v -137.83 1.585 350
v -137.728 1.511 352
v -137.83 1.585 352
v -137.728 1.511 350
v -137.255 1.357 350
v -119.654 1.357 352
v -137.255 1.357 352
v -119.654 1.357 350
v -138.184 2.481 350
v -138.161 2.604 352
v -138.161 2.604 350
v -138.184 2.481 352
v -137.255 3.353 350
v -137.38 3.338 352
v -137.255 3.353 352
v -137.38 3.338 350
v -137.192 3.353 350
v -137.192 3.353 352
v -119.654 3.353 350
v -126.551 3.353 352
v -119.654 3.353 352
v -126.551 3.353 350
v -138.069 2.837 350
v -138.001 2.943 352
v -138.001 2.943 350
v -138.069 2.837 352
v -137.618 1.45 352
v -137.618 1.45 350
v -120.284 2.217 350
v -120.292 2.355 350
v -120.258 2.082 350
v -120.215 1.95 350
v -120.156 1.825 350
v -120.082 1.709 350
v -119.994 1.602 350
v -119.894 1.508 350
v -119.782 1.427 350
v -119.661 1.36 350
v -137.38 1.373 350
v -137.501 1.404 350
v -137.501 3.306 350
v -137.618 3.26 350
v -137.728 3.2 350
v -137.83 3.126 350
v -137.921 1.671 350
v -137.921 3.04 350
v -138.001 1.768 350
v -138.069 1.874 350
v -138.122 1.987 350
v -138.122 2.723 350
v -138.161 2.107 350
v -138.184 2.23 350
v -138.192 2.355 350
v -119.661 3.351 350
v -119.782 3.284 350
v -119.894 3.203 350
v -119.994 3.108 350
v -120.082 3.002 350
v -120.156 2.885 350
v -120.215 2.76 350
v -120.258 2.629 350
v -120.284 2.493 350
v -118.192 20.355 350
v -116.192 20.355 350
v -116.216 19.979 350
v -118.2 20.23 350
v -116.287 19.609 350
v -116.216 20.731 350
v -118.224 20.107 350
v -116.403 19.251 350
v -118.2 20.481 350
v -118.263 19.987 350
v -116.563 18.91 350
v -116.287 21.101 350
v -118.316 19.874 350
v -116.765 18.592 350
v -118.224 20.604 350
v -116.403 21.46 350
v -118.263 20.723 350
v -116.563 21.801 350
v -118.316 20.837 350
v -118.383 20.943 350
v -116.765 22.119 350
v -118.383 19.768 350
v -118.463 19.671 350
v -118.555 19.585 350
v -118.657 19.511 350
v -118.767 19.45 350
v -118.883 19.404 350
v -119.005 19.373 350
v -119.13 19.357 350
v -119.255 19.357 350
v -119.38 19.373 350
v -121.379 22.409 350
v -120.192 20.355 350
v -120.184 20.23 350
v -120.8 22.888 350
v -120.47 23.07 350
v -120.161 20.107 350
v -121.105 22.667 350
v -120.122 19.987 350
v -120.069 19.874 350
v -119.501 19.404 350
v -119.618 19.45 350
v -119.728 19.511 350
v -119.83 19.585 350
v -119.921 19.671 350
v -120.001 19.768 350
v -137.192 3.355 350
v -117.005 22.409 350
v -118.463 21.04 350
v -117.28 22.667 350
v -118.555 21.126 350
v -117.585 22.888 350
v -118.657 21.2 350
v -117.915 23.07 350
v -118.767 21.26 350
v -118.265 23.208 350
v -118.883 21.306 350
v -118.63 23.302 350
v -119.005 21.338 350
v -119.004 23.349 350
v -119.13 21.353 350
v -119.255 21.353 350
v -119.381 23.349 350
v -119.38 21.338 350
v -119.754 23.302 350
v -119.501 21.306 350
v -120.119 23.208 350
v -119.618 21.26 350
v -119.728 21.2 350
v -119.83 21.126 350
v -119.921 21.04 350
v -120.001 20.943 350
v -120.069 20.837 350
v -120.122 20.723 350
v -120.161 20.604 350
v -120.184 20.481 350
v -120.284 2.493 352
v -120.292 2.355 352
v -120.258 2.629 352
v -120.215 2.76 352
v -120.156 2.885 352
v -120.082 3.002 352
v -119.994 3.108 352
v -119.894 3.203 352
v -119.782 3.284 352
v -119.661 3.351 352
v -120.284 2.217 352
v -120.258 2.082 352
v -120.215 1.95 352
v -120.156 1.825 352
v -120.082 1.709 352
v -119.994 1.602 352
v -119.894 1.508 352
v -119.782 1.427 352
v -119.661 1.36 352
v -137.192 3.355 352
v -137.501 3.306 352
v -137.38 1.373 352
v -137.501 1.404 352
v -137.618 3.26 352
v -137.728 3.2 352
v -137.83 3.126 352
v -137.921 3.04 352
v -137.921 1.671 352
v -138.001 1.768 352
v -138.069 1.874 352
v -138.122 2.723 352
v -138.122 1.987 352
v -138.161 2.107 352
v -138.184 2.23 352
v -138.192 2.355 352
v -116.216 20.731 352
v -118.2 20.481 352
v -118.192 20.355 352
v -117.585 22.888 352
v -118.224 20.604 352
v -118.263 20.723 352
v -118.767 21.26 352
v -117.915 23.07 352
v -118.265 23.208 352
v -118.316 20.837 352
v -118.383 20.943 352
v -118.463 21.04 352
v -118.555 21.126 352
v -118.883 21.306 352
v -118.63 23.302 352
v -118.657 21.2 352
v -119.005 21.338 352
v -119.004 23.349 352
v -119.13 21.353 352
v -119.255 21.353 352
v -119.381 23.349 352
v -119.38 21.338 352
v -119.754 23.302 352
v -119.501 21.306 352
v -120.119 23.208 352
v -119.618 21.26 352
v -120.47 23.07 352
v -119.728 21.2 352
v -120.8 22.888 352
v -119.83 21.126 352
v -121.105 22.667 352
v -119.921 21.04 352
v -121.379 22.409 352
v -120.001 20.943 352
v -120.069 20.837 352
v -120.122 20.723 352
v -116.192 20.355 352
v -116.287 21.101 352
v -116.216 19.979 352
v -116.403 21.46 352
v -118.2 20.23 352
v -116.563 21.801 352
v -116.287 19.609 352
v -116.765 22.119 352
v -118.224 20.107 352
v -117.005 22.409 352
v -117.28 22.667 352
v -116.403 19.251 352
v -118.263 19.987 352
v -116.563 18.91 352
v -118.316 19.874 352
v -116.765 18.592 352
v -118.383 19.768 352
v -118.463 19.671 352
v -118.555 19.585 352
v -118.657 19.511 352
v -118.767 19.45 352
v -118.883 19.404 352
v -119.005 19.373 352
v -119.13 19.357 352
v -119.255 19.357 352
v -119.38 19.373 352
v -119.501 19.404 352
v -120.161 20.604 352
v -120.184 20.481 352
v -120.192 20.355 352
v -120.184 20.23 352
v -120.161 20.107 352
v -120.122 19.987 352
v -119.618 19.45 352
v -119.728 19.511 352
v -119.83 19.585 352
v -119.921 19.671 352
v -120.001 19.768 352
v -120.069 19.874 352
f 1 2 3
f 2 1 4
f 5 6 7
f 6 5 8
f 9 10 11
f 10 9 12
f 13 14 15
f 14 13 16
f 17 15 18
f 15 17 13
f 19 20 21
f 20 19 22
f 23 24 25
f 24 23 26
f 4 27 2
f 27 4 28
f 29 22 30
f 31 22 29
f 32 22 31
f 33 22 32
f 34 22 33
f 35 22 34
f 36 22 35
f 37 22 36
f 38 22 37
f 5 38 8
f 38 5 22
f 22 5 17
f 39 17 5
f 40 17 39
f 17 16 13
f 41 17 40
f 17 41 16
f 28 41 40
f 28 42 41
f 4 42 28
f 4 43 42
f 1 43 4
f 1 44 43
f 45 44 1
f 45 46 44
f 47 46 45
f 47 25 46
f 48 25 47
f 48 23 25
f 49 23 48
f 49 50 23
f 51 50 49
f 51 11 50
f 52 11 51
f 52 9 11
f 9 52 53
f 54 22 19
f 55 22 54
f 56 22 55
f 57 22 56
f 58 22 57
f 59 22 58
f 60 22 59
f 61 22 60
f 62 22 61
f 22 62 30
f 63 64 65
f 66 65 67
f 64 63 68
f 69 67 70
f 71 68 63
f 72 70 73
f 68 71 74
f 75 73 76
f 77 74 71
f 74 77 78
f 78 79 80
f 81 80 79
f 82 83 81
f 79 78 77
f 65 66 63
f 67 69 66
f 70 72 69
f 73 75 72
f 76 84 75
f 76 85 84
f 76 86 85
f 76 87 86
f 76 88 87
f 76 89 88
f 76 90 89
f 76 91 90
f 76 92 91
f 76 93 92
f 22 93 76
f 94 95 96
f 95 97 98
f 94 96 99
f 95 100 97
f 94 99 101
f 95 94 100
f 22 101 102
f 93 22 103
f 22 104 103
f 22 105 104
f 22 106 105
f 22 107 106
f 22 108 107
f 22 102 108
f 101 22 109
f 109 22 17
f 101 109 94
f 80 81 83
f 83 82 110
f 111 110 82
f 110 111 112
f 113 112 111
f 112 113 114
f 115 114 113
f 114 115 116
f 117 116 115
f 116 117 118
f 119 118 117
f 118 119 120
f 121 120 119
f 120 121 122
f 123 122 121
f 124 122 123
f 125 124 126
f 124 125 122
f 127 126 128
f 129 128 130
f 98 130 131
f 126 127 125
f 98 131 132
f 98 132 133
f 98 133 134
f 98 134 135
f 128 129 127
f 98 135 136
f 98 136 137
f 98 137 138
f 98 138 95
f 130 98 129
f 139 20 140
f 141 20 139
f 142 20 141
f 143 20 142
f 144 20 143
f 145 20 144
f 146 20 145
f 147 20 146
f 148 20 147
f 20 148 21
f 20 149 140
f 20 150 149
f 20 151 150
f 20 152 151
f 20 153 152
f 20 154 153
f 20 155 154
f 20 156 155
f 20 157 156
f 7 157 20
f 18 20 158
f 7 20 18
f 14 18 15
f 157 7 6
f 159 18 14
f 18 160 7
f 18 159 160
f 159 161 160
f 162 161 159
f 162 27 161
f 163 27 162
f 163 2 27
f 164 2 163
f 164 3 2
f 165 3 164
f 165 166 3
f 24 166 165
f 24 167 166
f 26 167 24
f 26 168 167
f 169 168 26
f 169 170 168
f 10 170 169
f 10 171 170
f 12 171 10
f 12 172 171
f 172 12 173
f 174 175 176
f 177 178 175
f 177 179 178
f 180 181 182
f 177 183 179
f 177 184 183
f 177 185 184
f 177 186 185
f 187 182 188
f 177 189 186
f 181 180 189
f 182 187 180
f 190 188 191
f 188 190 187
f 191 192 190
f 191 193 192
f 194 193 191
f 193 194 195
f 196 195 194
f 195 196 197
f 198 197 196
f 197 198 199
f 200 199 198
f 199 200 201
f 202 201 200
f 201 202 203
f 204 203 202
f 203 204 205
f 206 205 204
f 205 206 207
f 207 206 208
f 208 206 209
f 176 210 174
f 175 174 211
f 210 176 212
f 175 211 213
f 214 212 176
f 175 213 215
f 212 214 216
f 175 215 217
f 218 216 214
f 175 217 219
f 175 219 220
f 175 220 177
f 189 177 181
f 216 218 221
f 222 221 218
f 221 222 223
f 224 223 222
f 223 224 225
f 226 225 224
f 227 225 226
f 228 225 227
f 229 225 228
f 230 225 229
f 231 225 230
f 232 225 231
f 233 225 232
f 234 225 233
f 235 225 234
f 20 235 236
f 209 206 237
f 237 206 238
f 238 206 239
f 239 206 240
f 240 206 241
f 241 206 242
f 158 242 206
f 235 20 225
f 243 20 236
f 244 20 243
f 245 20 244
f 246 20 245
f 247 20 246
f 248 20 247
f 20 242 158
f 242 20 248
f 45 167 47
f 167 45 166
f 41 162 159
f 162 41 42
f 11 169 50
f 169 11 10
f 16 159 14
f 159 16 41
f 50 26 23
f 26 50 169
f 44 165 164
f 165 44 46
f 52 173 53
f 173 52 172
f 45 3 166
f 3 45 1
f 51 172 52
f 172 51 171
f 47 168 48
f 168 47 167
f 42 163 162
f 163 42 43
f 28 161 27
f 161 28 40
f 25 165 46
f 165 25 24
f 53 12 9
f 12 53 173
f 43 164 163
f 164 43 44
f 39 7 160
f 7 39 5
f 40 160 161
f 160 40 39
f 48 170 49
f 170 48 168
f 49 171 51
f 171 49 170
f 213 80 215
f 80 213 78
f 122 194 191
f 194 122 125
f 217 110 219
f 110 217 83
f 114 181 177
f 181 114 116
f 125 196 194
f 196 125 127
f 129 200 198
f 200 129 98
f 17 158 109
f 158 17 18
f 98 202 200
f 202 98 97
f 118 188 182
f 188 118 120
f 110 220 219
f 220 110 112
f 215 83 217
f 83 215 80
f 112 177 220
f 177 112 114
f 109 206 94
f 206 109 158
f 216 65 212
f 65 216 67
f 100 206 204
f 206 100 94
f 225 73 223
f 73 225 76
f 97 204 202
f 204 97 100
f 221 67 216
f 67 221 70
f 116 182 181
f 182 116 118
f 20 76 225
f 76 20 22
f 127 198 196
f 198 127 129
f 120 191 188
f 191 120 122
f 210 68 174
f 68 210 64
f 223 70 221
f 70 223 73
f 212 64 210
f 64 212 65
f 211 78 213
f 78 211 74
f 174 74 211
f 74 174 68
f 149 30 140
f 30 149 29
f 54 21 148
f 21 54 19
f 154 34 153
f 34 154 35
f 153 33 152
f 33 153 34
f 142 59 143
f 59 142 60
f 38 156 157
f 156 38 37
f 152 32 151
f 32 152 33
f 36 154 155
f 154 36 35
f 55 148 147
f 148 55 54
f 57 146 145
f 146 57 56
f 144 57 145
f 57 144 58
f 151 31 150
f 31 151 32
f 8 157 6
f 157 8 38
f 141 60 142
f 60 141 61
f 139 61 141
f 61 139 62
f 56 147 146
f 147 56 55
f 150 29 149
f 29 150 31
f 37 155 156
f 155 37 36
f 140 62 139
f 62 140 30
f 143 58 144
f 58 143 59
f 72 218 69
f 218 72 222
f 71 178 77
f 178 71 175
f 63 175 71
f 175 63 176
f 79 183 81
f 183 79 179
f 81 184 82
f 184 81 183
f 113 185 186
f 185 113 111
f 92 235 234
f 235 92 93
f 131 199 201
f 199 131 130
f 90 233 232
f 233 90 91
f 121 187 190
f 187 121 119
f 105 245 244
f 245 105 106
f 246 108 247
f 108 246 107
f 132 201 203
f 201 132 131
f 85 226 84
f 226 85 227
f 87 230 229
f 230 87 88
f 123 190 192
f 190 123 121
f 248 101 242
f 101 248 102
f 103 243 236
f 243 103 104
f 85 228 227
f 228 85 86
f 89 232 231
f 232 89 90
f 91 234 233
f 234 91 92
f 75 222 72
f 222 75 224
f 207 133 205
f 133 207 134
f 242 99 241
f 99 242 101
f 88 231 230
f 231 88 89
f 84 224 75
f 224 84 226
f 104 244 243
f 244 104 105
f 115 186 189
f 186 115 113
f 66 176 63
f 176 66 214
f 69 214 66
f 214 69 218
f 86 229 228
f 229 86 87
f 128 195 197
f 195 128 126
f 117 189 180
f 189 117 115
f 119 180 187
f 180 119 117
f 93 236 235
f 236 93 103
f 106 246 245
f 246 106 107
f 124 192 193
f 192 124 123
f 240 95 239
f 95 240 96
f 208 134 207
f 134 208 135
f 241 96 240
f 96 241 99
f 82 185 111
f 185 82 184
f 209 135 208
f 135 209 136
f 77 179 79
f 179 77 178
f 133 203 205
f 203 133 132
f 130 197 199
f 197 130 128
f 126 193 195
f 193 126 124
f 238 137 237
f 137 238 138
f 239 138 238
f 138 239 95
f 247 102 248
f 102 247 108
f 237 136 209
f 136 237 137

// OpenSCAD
// file: ../planelib/motor.scad
yoff=10+2;
xoff=5;//10+17;
xlen=200;

module wingBoom( bd=8, diff=0.1, len=500 )
{
    translate([xoff,yoff,zBoom])
    translate([ -200,0,0]) rotate([0,90,0])cylinder(d=bd+diff,h=len,center=true);  //8mm version

}



module wingMotorPlate( diff=0, holes=true )
{
    h0=12;
    module mcylinder( diff=0 )
    {
        rotate([0,-90,0]) 
            translate([ 0,0,-3-diff ]) 
                cylinder(d=33+diff, h=55+diff,center=false);   // body cylinder
    }
    
    module mholes()
    {
        rotate([0,-90,0]) 
            ScrewMotorPlate(screwlen=60);
    }
    
    module cable_hole()
    {
        translate( [ -3, 15, 0 ] )
        rotate([90,0,0])
        hull(){
            translate([-10,0,0]) cylinder(d=5,h=10,center=true );
            translate([0,-2,0]) cylinder(d=4,h=10,center=true );
            translate([0,+2,0]) cylinder(d=4,h=10,center=true );
        }
    }

    difference(){
        union()
        {
            translate([xoff,yoff,zBoom])
                difference(){
                    mcylinder(0+2*diff);
                    if( holes==true ){
                        mcylinder(-4-2*diff);
                        mholes();
                        cable_hole();
                    }
                }
            translate([xoff,yoff,zBoom])
                intersection(){
                    mcylinder(0);
                    translate([-tubeOffset1-xoff ,tubeOffsety-yoff, 0]) 
                        cylinder(d=dBar1+8, h=33,center=true ); // bar mount
                    }
        }
        union()
        {
            if( holes==true ){
                translate([-tubeOffset1 ,tubeOffsety, zBoom]) 
                            cube([dBar1+10,dBar1+10,12+0.2], center=true );
                translate([ xoff-120/2-tubeOffset1, yoff, zBoom]) 
                    rotate([0,90,0])
                        cylinder(d=8+0.3+4+0.5,h=140,center=true);  // mount for boom 8mm version
                            
                wingPolyLine( d=dPoly, pt=pSD6060[31], off=[+2,+0.5] );
                wingElectric();
                xTube( diameter=8+0.1, length=1000, tubeoffset=tubeOffset1 );
                translate( [-xoff+0, yoff-11.2, zBoom ] ) 
                    rotate([90,0,0])
                        ScrewAndHexNut( m=2,dist=10 );
                }
            
        }
    }


}

module wingMotor(diff=0, holes=true) //use diff!!!!!
{
    h0=12; //10;    
    {
        difference(){
            union(){
                Slice(){
                    wingSolid(r=-1/*diff*/);
                    translate([ xoff-130/2-3-10, yoff-15+1, zBoom]) cube([150,25+2,h0], center=true );
                    }
                
                translate([-tubeOffset1 ,tubeOffsety, zBoom]) cylinder(d=dBar1+10, h=h0,center=true );
                translate([-tubeOffset2 ,tubeOffsety, zBoom]) cylinder(d=dBar2+10, h=h0,center=true );
                
                translate([ xoff-120/2-tubeOffset1, yoff, zBoom]) rotate([0,90,0])cylinder(d=8+4,h=120,center=true);  //8mm version
                
                }
            union(){
                translate([xoff-153,yoff-21,zBoom])
                    rotate([0,0,-45])
                        cube([20,20,20], center=true );

                if( holes==true ){
                    color("Black") wingBoom();
                    color("Black") xTube( diameter=8+0.2, length=1000, tubeoffset=tubeOffset1 );
                    color("Black") xTube( diameter=6+0.2, length=400, tubeoffset=tubeOffset2 );   
                    wingMotorPlate(diff=0.1); 
                    wingPolyLine( d=dPoly, pt=pSD6060[31], off=[+2,+0.5] );
                    *wingPolyLine( d=dPoly, pt=ptQRuder, off=[+0,+0] );
                    wingElectric();
                    translate( [-xoff+0, yoff-11.2, zBoom ] ) 
                        rotate([90,0,0])
                            ScrewAndHexNut( m=2,dist=10 );
                    translate([xoff,yoff,zBoom])
                        translate([-83,-8,0]) rcube([54,4,20], round=3);
                    translate([xoff-35,yoff-15,zBoom]){
                        translate([-113,2,0]) cube([30,20,1.2], center=true );
                        translate([-113,8,0]) ScrewAndHexNut( m=2,dist=8 );
                        }
                        
                    }
                }
        }
       
    }
    
    *translate([xoff,yoff,zBoom]){
        color("Red") translate([15+12,0,0]) rotate([0,90,0]) cylinder(d=7*25.4,h=8,center=true);   // propeller     
        color("Red") translate([12,0,0]) rotate([0,90,0]) cylinder(d=33,h=17,center=true);   // motor
        *%translate([0,-60,0]) cube( [300,1,500], center=true );
        }
    *color("Black") xTube( diameter=8, length=1000, tubeoffset=tubeOffset1 );
    *color("Black") xTube( diameter=6, length=400, tubeoffset=tubeOffset2 );    
    *wingMotorPlate(diff=0);

}

module wingMotorCoverSolid()
{
    diff=0;
    hull(){
        translate([xoff-55,yoff,zBoom]) // body cylinder taken from wingMotorPlate()
            rotate([0,-90,0]) 
                translate([ 0,0,-3-diff ]) 
                    cylinder(d=33+diff, h=1,center=false);   
        translate([ xoff-120+0.5-tubeOffset1, yoff, zBoom]) rotate([0,90,0])cylinder(d=8+4+2,h=1,center=true);  // taken from wingMotor
        }
}

module fuseMotor(d=0.5, holes=true) // not needed with two motors at the wings
{
// 19mm Löcher, Motokreuz: Balken mit 2 Schrauben, Gegenstück in den Rumpf kleben....
    translate([9.5,0,0])
    difference()
    {
        union()
        {
            translate([-280,0,0]){   // cutout inner Motormount
                rotate([0,90,0]) cylinder( d=30-d, h = 3 ); // h=5 was too fat, because it is solid
                }
            translate([-282,0,0]){   // cutout outer Motormount
                rotate([0,90,0]) cylinder( d=35-d, h=3 );
                }
            translate([-282,0,0]){   // cutout outer Motormount
                rotate([0,90,0]) resize([50,20,3])cylinder( d=35-d, h=3 );
                }
            translate([-260,0,+20]) 
                    rotate([0,-90,0]) 
                        cylinder( d=3.8, h=30 );   
            translate([-260,0,-20]) 
                    rotate([0,-90,0]) 
                        cylinder( d=3.8, h=30 );  
            if( !holes ){
            translate([-250+6,0,-20]) 
                    rotate([0,-90,0]) 
                        cylinder( d=6.5, h=30,$fn=6 );   
            translate([-250+6,0,+20]) 
                    rotate([0,-90,0]) 
                        cylinder( d=6.5, h=30,$fn=6 );   
                }
            
        }
        if(holes)
        union()
        {
            translate([-270,0,0]) 
                    rotate([0,-90,0]) 
                        cylinder( d=9, h=40 );   
            translate([-270,0,0])
                rotate([0,-90,0])
                    for( rot=[0:90:360] )
                        rotate([0,0,rot+45])
                            translate([0,19/2,0])
                                    cylinder( d=3.8, h=40 );
            translate([-260,0,+20]) 
                    rotate([0,-90,0]) 
                        cylinder( d=3.8, h=30 );   
            translate([-260,0,-20]) 
                    rotate([0,-90,0]) 
                        cylinder( d=3.8, h=30 );   
        }
    }
}
// file: ../planelib/ruder2.scad
// Ruder new version, test with small cut, printable?

*cutterObjectAll( ptStart=[0,0,0], dStart=20, ptStop=[-20,0,100], dStop=10, dSpace=1.0, rot=45, steps=5, inverse=false );
*cutterMask( ptStart=[0,0,0], dStart=20+2*1, ptStop=[-20,0,100], dStop=10+2*1 );
*cutterEnds( pt=[0,0,0], d=20+2*1, dSpace=1.0, axis=false );

function RuderGetSize( z, zStart, zStop, sStart, sStop ) = ( ( sStart + (sStop-sStart)/(zStop-zStart)*(z-zStart) ) );
function RuderGetHeight( z, zStart, zStop, sStart, sStop, hBase ) = ( RuderGetSize( z, zStart, zStop, sStart, sStop) * hBase );
function RuderGetPoint( z, zStart, zStop, sStart, sStop, ptBase ) = ( RuderGetSize( z, zStart, zStop, sStart, sStop) * ptBase );
function RuderGetXOffset( z, zStart, zStop, oStart, oStop ) = ( ( oStart + (oStop-oStart)/(zStop-zStart)*(z-zStart) ) );

module Ruder2( ptStart=[0,0,0], dStart=20, ptStop=[0,0,100], dStop=10, dSpace=1.0, rot=45, steps=5, inverse=false, horn=false )
{
    difference(){
        children();
        cutterObjectAll(  ptStart, dStart, ptStop, dStop, dSpace, rot, steps, inverse );
        cutterInnerAxis( ptStart, ptStop );
        cutterEnds( ptStart, dStart, dSpace, axis=false );
        cutterEnds( ptStop, dStop, dSpace, axis=false );
        }
        
    if( horn ) 
        RuderHorn( dbase=dStart, pos = ptStart + [0,0,dSpace/2] );
}

module RuderHornCut(dbase, daxsis=2.2, dwire=2, pos=[0,0,0], h=2, a=18, diff=0)
{
    //scale([1,1,2])
    cutterEnds( pos, d=dbase, dSpace=0.2, axis=true );
}

module RuderHorn( dbase, daxsis=2.2, dwire=2, pos=[0,0,0], h=2, a=18, diff=0 )
{
    b=a;
    translate( pos ) 
        difference(){
            union(){
                hull(){
                    translate([0,0,0])  cylinder( d=dbase-2+diff, h=h, center=false );
                    translate([-a,0,0]) cylinder( d=2+diff, h=h, center=false );
                    }
                hull(){
                    translate([-a,0,0]) cube( [10,1,h], center=false );
                    translate([0,b,0])  cylinder( d=6+diff, h=h, center=false );
                    }
                }
            union(){
                translate([0,0,0])  cylinder( d=daxsis, h=h, center=false );
                translate([0,b,0])  cylinder( d=dwire, h=h, center=false ); 
                //translate([-a,0,0])  cylinder( d=dwire, h=h, center=false ); 
                c = b-6/2-dbase/2; 
                *translate([-c,c,0])  cylinder( d=c, h=h, center=false ); 
            }
    }
}

module cutterObjectAll( ptStart, dStart, ptStop, dStop, dSpace, rot=45, steps=5, inverse=false )
{
    ptDelta = (ptStop - ptStart) / steps; 
    dDelta = (dStop - dStart) / steps; 
    
    for( i=[0:steps-1] )
    {
        dir = inverse ? !((i%2)==0) : ((i%2)==0) ;
        cutterObjectSingle(  
            ptStart+i*ptDelta, dStart+i*dDelta, 
            ptStart+(i+1)*ptDelta, dStart+(i+1)*dDelta, 
            dSpace, dir, steps );
    }
}

module cutterObjectSingle( ptStart, dStart, ptStop, dStop, dSpace, dir=false, rot=45 )
{
    difference()
    {
        union()
        {
            cutterCylinder( ptStart, dStart+2*dSpace, ptStop, dStop+2*dSpace );
            if( dir == true )
            {
                cutterMask( ptStart, dStart+2*dSpace, ptStop, dStop+2*dSpace, dir, rot=+rot );
                cutterMask( ptStart, dStart+2*dSpace, ptStop, dStop+2*dSpace, dir, rot=-rot );
            }
            cutterSpacer( ptStart, dStart+2*dSpace, dSpace ); // find a way to not call cutterSpacer at the ends?
            cutterSpacer( ptStop, dStop+2*dSpace, dSpace ); // this partly dublicate
        }
        union()
        {
            cutterCylinder( ptStart, dStart, ptStop, dStop );
            cutterHalf( ptStart, dStart, ptStop, dStop, dir );
        }
    }
}

module cutterCylinder( ptStart, dStart, ptStop, dStop )
{
    hull()
    {
        translate( ptStart ) cylinder( d=dStart, h=0.001, center=true );
        translate( ptStop )  cylinder( d=dStop, h=0.001, center=true  );
    }
}

module cutterMask( ptStart, dStart, ptStop, dStop, dir=true, rot=40 )
{
    oxStart = dir ? 0 : -dStart;
    oxStop = dir ? 0 : -dStop;
    
    hull(){
        translate( ptStart ) 
            rotate( [0,0,rot] )
                translate( [oxStart,-dStart/2,0] )
                    cube([dStart/2,dStart, 0.001], center=false );
        translate( ptStop ) 
            rotate( [0,0,rot] )
                translate( [oxStop,-dStop/2,0] )
                    cube([dStop/2,dStop, 0.001], center=false );
        }
}

module cutterHalf( ptStart, dStart, ptStop, dStop, dir=true )
{
    oxStart = dir ? 0 : -dStart;
    oxStop = dir ? 0 : -dStop;
    hull(){
        translate( ptStart ) 
                translate( [oxStart,-dStart,0] )
                    cube([dStart,2*dStart, 0.001], center=false );
        translate( ptStop ) 
                translate( [oxStop,-dStop,0] )
                    cube([dStop,2*dStop, 0.001], center=false );
        }
}

module cutterSpacer( ptStart, dStart, dSpace )
{
    translate( ptStart )
        cylinder( d=dStart, h=dSpace, center=true );
}

module cutterInnerAxis( ptStart, ptStop, dAxis=2.2 )    // set the correct parameter dAxis
{
    hull()
    {
        translate( ptStart ) sphere( d=dAxis );
        translate( ptStop ) sphere( d=dAxis );
    }
}

module cutterEnds( pt, d, dSpace, axis=false )
{
    translate( pt ) 
        difference()
        {
            union()
            {
                cylinder( d=d+2*dSpace, h=dSpace, center=true );
                translate( [-100,-20,-dSpace/2] ) cube( [100,40,dSpace], center=false );
            }
            if ( axis==false ) cylinder( d=d+2*dSpace, h=dSpace, center=true );
        }
}
// file: ../planelib/screw.scad
// screw and nut helper


//ScrewAndHexNut( m=2, $fn=50 );

module ScrewAndHexNut( m=2, dist=10 )
{
    
    dscrew  = (m==2) ? 2.3 : ((m==3) ? 3.2 : 4.1 );   // screw, loose
    dnut    = (m==2) ? 4.6 : ((m==3) ? 6.2 : 8.0 );   // hex nut, measured
    dhead   = (m==2) ? 4.2 : ((m==3) ? 5.8 : 7.0 );   //hex head
    
    translate( [ 0, 0, -dist/2-10/2 ] ) 
        cylinder(d=4.6, h=10, center=true, $fn=6 ); //m2 nut, 6 edge hole
    translate( [ 0, 0, 0 ] ) 
        cylinder(d=2.3, h=dist+20, center=true ); //m2 screw
    translate( [ 0, 0, +dist/2+10/2 ] ) 
        cylinder(d=4.2, h=10, center=true ); //m2 head
}

module ScrewServo( dist=10 )
{
    cylinder(d=1.5, h=dist ); // servo screw, does not realy fit
}

module ScrewMotorPlate( dscrew=3.5, distmin=15.5, distmax=19.5, dcenter=8, rotoffset=0, screwlen=6, plate=6 )
{
    for( a=[45:90:360]) 
        rotate([0,0,a+rotoffset]) 
            hull(){
                translate( [0, distmax/2, -plate-0.1] ) // max plate is fixed 6
                    cylinder( d=dscrew, h=screwlen, center=false ); // motor screws
                translate( [0, distmin/2, -plate-0.1] ) 
                    cylinder( d=dscrew, h=screwlen, center=false ); // motor screws
                }
    translate( [0, 0, -plate-0.1] ) 
        cylinder( d=dcenter, h=plate+1, center=false ); // motor center

}
// file: ../planelib/servo.scad
servo_size_1 = [25.5,12,37];  // mg90s
servo_size_2 = [33.5,12,3];

*servo_sg90($fn=50);

module servo_sg90()
{
        cube( servo_size_1, center=true );
        translate([0,0,3.5]) 
            cube( servo_size_2, center=true );
        // servoarm...
        translate([-5,6,17])
        resize([60,12,6+1])
        sphere( d=1 );
}
    

module ServoDiff( sx=100, sy=7, sz=348, rot=0 )
{ 
    //sx = s[i]*(tubeOffset1+tubeOffset2)/2;  // between the tubes
    //sz = (o[i+1].z-o[i].z)/2;   // in the middle of the segment
    //sz = -2;
    translate( [-sx, sy, sz])
            rotate([0,rot, 2])
                servo_sg90();
                
    
    // kabelkanal
    *translate( o[i] + [-sx+10, +11-2-2, hz/2-13])
            rotate([0,90,4])
                cube([12,5,10]);
}
// file: ../planelib/polyline.scad
module wingPolyLine( d=3, pt=[0,0], off=[0,0]  )
{
    *echo(pt);
    l = len(s)-1; 
    poly = [         [o[0].x - s[0]*pt.x - off.x , o[0].y + s[0]*pt.y + off.y,  o[0].z - 20 ],
        for(i=[0:l]) [o[i].x - s[i]*pt.x - off.x , o[i].y + s[i]*pt.y + off.y,  o[i].z ],
                     [o[l].x - s[l]*pt.x - off.x , o[l].y + s[l]*pt.y + off.y,  o[l].z + 20 ] ];
    *echo( poly);
    for( i=[0:(len(poly)-2)] ){
        hull(){
            translate(poly[i]) 
                sphere( d=d );
            translate(poly[i+1]) 
                sphere( d=d );
            }
        }
}

module fusePolyLine( d=3, size=605, off=[0,0], p=pClarkFusePolyUp )
{
    for( i=[0:(len(p)-2)] ){
        hull(){
            translate([p[i].x*size, p[i].y*size+off.y, +off.x]) 
                sphere( d=d );
            translate([p[i+1].x*size, p[i+1].y*size+off.y, +off.x]) 
                sphere( d=d );
            }
        *echo( p[i] );
        }
}

module fusePolyLineQ( d=3, size=605, pt=[0,0], off=[0,0] )
{
    poly = [        
                    [o[1].x - s[1]*pt.x - off.x , o[1].y + s[1]*pt.y + off.y,  +o[1].z ],
                    [o[0].x - s[0]*pt.x - off.x , o[0].y + s[0]*pt.y + off.y,  +o[0].z ],
                    [o[0].x - s[0]*pt.x - off.x , o[0].y + s[0]*pt.y + off.y,  -o[0].z ], 
                    [o[1].x - s[1]*pt.x - off.x , o[1].y + s[1]*pt.y + off.y,  -o[1].z ]
                    ];
                    
        for( i=[0:(len(poly)-2)] ){
                hull(){
                    translate(poly[i]) 
                        sphere( d=d );
                    translate(poly[i+1]) 
                        sphere( d=d );
                    }
        }
}

module offsetPolyLine(  d=3, size=605, off=10, p=pClarkY )  // this does not yet work, just a test.
{
    for( i=[0:(len(p)-1)] ){
        po = size * p[i];
        pv = size * ((i>0) ? p[i-1] : p[len(p)-1]);
        pn = size * ((i>(len(p)-2)) ? p[0] : p[i+1]);

        pop = (pv + pn)/2 + po;
        p02 = pn - po;
        z = p02.x * pop.y + p02.y * pop.x;
        
        pt = sign( z ) * pop * (off/norm(pop));
       

        
        hull(){
            translate([po.x+pt.x, po.y+pt.y, 0]) 
                sphere( d=d );
            translate([pn.x+pt.x, pn.y+pt.y, 0]) 
                sphere( d=d );
            }
        echo( po, pop, z );
    }
}
// file: ../planelib/wing.scad
module segment( s, o, r=0, p=pSD6060, begin=0, end=1 )
{
    factor = ( s[1] ) / ( s[0] );
    height = ( o[1].z - o[0].z );
    sx = ( o[1].x - o[0].x ) / height;
    sy = ( o[1].y - o[0].y ) / height;
    
    m=[ [ 1, 0,  sx, 0],
        [ 0, 1,  sy, 0],
        [ 0, 0,  1,  0],
        [ 0, 0,  0,  1] ];
    
    translate(o[0])
        multmatrix(m)
            linear_extrude( height=height, scale=factor, convexity=10 ) 
                intersection()
                {
                    spant2d( s=s[0], r=r, p=p );
                    scale(s) 
                        mirror([1,0]) // vgl spant2d()
                            translate( [begin,-0.5] ) 
                                square( [(end-begin), 1] );
                }
}


module spant3d( d=0.3, offset=[0,0,0], size=100, r=0, p=pSD6060 )
{
    translate(offset) linear_extrude( d, convexity=10 ) spant2d(size,r,p);
}

module spant3dDiff( d=0.3, offset=[0,0,0], size=100, rot=[0,0,0], ra=0, ri=-2.5, p=pSD6060 )
{
    translate(offset) rotate(rot) translate([0,0,-d/2]) linear_extrude( height=d, convexity=10 )
    difference()
    {
        spant2d( s=size, r=ra, p=p );
        spant2d( s=size, r=ri, p=p );
    }
}

module spant2d(s=1, r=0, p=pSD6060 )
{
    offset(delta=r)
    //alternative: offset(r=r)
    scale(s)
    mirror([1,0])  // sollte das weg?
    polygon(p);
}
// file: ../planelib/skin.scad
module outerSkin( d=1, h=0, center=true )
{
    hgt = (h<=0) ? h : 2*d;
    difference(){
        minkowski(){
            children();
            cylinder(r=d,h=hgt,center=center ); 
        }
        children();
    }
}

module outerSkin2( d=1, h=0, center=true )
{
    hgt = (h<=0) ? h : 2*d;
    difference(){
        minkowski(){
            children(0);
            cylinder(r=d,h=hgt,center=center ); 
        }
        children(1);
    }
}

module innerSkin( )
{
    difference(){
        children(0);
        children(1);    
        }
}

module skin2()
{
    difference()
    {
        minkowski()
        {
            children(0);
            children(1);    
        }
        children(0);
    }
}

module Slice( )
{
    intersection()
    {
        children(0);
        children(1);
    }
}

module gridSlice( dy=30, angy=30, grid=2, dim=1000 )
{
    Slice(){
        children();
        for(z=[-dim:dy:dim], angy=[-angy,+angy])  
            translate([0,0,z])  
                rotate([0,angy,0])
                    cube([dim,dim,grid], center=true );
    }

}

module linearSlice( sh=100, sx=100, org=[0,0,0], rot=[0,0,0], center=true )
{
    Slice()
    {
        children();
        translate( org + [0,0,+sh/2] )
            rotate( rot )
                cube( [4*sx,2*sx,sh], center=center );
    }
}

module radialSlice( sh=100, sx=100, org=[0,0,0], rot=[0,0,0], mode=0, center=true )
{
    Steps = 120;
    Slice()
    {
        children();
        translate( org + [0,0,0] )
            rotate( rot )
                radialSliceHelper( d=2*sx, sh=sh, mode, center );
    }
}

module radialSliceHelper( d, sh, mode=0, center=true )
{
    gap = 0.1;  // 0.5 was too loose
    
    if( mode==0 ){
        cylinder( d=d, h=sh, center=center );
        }
            
    if( mode==1 ){
        difference(){
            union(){
                cylinder( d=d, h=sh, center=center );
                for( r=[0:120:360] )
                    translate([0,0,0]) rotate([0,90,r]) cylinder( d=10, h=d, center=center );
                }
            union(){
                for( r=[0:120:360] )
                    translate([0,0,sh]) rotate([0,90,r]) cylinder( d=10+0.2, h=d, center=center );
                }
            }
        }
 //hier war der marker..       
    if( mode==2 ){
        cx=5;
        cy=d/10;
        difference(){
            union(){
                cylinder( d=d, h=sh, center=center );
                for( r=[0:90:360] )
                    translate([0,0,0]) rotate([0,90,r]) cube([cx,cy,d],center=false); // d is diameter, cx,cy is size
                }
            union(){
                for( r=[0:90:360] )
                    translate([0,0,sh]) 
                        rotate([0,90,r]) 
                            translate([-gap,-gap/2,0])
                                cube([cx+gap*2,cy+gap,d],center=false);
                }
            }
        }
}

*rcube( [10,20,30], center=true, round=1 );
module rcube( size, center=true, round=1 )
{
    translate( center==true ? [0,0,0] : size/2 )
        hull() for (x=[1,-1],y=[1,-1],z=[1,-1]) translate([ x*size.x/2-round, y*size.y/2-round, z*size.z/2-round]) sphere( r=round );
}

module rcylinder( d=10, h=20, center=true, round=2 )
{
    minkowski(){
        cylinder( d=d-2*round, h=h-2*round, center=center);
        sphere( r=round );
        }
}

module show( d = [10,10,10] )
{
    for( i=[0:$children-1] )
    {
    translate( i * d )
        children(i);
    }
}
// main file
include <../planelib/inspectoer.scad>

RuderHorn( dbase=d1, pos = o[2] + [-ptQRuder.x*s[2], +ptQRuder.y*s[2], 0]  ); /*dSpace is 0.8*/         
